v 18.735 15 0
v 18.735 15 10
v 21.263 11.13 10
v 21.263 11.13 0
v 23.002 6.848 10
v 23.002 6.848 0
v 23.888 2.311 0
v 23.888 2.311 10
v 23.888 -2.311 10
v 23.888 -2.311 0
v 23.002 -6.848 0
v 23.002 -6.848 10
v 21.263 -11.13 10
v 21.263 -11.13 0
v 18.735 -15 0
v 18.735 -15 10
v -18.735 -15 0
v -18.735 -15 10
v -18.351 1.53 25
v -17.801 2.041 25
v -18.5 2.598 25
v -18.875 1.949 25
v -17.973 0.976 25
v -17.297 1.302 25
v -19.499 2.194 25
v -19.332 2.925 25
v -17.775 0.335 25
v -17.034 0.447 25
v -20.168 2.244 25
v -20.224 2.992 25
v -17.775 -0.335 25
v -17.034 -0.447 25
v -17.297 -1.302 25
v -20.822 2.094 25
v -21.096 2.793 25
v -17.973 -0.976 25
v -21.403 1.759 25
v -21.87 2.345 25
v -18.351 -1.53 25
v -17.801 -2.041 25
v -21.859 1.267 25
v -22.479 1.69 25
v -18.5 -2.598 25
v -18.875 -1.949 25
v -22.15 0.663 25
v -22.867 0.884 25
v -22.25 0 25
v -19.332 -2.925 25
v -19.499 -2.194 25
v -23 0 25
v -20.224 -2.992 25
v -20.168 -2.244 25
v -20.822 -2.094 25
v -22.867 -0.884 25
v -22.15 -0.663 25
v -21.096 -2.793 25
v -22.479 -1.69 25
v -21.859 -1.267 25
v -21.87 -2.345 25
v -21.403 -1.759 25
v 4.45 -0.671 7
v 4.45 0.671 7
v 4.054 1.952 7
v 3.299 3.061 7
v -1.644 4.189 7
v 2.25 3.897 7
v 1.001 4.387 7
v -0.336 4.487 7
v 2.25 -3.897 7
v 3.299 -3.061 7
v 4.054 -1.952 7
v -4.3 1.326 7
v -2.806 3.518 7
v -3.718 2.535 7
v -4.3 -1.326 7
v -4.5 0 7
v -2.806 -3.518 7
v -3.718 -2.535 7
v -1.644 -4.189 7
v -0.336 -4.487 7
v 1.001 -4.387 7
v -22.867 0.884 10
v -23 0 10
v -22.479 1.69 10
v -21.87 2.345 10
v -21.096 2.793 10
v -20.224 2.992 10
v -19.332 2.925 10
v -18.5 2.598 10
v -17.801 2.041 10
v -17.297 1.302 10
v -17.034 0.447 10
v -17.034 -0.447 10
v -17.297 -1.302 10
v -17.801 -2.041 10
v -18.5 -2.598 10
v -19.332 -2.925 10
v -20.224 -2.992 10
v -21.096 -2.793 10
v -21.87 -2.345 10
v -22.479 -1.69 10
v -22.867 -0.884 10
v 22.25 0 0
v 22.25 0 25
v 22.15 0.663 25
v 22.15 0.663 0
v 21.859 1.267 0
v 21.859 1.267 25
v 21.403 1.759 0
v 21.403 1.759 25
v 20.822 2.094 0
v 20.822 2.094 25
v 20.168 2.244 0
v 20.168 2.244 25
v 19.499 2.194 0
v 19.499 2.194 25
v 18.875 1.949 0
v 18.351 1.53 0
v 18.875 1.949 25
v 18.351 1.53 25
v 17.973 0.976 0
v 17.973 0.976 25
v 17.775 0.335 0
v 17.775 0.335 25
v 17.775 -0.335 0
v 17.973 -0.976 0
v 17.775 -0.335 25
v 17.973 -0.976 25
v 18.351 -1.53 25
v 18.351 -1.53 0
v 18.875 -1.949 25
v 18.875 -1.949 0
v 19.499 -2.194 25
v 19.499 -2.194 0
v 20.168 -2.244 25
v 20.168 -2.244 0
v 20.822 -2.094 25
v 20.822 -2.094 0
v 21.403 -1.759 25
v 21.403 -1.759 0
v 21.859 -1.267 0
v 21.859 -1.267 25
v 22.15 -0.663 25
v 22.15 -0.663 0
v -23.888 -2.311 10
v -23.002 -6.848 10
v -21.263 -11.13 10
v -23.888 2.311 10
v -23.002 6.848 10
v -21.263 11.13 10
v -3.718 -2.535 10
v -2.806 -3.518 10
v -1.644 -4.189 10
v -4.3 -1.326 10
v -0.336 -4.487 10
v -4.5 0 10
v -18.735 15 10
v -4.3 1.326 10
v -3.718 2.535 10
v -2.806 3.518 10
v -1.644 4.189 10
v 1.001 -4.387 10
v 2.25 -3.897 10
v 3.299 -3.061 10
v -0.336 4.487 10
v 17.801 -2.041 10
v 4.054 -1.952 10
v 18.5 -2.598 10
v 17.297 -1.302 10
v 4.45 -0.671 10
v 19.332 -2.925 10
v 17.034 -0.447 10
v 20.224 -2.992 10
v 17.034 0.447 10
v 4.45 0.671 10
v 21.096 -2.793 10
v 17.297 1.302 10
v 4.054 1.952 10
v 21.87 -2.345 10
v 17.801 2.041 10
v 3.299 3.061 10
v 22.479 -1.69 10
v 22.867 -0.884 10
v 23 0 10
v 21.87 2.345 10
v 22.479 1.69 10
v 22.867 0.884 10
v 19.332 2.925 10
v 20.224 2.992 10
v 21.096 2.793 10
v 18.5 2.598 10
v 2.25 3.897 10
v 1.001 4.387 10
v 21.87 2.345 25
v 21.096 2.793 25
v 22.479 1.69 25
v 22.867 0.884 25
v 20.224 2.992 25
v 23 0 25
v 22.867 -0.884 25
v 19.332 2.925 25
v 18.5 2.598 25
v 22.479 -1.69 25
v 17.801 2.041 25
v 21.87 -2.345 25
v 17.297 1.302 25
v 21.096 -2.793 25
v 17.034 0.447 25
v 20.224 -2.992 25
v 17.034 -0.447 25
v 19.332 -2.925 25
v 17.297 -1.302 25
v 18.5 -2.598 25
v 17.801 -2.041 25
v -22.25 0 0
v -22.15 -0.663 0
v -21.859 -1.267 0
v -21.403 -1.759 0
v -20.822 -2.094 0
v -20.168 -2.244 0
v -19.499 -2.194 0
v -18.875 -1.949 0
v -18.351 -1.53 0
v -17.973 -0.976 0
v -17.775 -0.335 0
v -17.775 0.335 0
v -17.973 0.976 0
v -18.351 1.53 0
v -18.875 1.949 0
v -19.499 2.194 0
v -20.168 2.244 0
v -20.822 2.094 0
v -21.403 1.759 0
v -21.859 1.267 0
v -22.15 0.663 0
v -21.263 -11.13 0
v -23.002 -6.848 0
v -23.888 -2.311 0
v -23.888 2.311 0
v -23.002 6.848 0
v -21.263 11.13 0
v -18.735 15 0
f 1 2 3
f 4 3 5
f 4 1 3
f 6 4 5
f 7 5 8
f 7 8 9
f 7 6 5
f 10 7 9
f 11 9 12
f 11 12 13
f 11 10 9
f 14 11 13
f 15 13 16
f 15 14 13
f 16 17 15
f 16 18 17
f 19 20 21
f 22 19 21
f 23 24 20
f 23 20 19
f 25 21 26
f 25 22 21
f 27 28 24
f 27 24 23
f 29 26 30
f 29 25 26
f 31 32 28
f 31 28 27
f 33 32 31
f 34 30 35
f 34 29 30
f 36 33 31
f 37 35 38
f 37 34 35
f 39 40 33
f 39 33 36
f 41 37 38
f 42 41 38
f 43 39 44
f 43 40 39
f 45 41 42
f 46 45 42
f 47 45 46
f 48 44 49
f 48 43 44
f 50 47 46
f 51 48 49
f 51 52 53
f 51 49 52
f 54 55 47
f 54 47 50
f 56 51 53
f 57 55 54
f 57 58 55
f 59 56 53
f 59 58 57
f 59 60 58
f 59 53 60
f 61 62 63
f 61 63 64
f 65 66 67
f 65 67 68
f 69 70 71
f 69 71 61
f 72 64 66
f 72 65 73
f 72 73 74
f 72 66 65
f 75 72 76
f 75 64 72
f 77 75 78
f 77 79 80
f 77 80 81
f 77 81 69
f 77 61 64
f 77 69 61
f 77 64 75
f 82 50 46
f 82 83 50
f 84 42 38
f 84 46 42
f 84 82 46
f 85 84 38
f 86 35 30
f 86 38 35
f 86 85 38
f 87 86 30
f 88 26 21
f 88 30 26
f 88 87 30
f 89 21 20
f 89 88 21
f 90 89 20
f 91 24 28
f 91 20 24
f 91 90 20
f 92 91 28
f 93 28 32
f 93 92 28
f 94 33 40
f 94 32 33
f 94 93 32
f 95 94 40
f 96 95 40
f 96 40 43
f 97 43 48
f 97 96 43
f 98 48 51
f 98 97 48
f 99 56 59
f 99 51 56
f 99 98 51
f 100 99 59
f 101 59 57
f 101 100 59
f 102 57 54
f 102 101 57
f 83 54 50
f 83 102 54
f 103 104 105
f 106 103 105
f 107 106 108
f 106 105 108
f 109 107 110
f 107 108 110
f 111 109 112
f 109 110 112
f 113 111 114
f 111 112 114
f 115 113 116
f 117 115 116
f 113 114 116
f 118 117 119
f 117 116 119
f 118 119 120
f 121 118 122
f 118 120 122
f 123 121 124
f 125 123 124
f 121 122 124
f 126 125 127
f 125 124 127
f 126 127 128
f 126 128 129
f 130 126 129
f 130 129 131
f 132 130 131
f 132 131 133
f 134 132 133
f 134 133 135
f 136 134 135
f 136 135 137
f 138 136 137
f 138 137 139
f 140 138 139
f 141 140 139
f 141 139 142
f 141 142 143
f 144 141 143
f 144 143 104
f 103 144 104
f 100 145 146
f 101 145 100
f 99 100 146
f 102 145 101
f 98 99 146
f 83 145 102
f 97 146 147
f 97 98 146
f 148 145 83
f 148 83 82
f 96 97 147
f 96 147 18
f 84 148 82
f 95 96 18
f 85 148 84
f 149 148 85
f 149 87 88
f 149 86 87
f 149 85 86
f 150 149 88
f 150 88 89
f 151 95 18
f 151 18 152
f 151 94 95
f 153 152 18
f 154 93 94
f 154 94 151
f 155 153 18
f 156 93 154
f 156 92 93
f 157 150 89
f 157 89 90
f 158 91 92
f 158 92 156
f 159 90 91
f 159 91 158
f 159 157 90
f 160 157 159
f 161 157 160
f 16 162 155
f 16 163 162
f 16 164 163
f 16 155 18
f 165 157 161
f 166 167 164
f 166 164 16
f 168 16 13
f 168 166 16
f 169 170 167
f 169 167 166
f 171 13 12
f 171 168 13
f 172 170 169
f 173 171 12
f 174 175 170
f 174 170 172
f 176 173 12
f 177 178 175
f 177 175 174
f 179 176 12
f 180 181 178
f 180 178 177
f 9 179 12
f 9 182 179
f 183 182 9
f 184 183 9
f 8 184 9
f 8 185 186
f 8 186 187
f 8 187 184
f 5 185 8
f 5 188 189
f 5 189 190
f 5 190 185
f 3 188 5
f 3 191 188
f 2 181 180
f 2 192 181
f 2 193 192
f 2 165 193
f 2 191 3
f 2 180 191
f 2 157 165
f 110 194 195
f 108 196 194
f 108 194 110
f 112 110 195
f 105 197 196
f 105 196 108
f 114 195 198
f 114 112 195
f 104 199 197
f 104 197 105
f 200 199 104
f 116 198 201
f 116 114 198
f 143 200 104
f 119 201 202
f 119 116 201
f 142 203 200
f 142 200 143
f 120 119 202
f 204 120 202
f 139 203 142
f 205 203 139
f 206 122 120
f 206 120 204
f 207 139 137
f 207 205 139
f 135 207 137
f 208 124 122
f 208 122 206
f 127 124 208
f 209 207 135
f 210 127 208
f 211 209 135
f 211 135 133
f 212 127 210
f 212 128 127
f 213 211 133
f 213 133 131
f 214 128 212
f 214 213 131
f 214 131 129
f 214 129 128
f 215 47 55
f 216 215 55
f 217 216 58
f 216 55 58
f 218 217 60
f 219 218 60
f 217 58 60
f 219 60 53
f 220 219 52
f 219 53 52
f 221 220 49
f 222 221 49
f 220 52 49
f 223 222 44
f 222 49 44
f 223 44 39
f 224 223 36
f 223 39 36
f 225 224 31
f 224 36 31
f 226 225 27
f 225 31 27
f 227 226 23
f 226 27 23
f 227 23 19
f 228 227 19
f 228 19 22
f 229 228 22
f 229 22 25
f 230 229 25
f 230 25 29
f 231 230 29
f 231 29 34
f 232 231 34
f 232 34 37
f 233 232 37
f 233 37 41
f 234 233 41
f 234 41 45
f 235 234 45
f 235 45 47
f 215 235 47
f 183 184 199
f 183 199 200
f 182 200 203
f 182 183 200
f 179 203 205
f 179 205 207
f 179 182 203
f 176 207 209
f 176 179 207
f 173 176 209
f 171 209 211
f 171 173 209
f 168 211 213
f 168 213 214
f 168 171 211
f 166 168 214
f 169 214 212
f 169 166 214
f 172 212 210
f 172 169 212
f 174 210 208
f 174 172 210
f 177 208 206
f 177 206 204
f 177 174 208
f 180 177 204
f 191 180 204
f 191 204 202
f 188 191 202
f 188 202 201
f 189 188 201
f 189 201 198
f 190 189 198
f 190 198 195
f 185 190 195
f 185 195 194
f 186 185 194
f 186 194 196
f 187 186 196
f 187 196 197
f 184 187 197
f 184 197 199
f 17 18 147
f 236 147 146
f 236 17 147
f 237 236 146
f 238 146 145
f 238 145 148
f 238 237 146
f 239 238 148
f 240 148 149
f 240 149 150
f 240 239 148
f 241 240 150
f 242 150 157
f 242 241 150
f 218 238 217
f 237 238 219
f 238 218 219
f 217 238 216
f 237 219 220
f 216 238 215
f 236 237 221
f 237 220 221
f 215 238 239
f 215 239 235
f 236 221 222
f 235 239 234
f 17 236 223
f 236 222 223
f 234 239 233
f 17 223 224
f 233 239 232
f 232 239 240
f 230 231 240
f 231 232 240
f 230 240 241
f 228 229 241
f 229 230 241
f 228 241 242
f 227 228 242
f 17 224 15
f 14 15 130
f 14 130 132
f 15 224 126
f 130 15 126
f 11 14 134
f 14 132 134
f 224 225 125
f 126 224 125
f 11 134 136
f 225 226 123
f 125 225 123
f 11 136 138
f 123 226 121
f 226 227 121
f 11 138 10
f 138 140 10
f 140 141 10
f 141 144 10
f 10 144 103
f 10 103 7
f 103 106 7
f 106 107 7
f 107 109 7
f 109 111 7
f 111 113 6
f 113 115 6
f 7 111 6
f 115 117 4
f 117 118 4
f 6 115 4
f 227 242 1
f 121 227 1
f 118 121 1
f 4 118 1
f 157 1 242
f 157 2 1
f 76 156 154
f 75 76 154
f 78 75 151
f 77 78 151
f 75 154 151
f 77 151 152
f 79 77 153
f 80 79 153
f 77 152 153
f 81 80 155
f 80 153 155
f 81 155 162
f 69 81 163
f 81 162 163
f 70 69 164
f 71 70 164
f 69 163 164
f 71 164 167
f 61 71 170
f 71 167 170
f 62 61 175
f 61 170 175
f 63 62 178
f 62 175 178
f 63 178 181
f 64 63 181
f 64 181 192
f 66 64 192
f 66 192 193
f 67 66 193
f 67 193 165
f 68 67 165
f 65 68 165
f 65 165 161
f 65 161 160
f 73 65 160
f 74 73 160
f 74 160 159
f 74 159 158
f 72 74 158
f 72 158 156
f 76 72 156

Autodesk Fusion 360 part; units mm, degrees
sketch "Esquisse1" plane through (0, 0, 0) normal (0, 0, 1) x (1, 0, 0)
  circle A0 centre (0, 0) radius 24
  dimension "d1" = 48
extrude "Extrusion1" add sketch "Esquisse1" along normal blind 10
sketch "Esquisse2" plane through (0, 0, 10) normal (0, 0, 1) x (-1, 0, 0)
  circle A0 centre (0, 0) radius 24
  circle A1 centre (0, 0) radius 4.5
  dimension "d4" = 9
extrude "Extrusion2" cut sketch "Esquisse2" against normal blind 3 contours A1
sketch "Esquisse3" plane through (0, 0, 10) normal (0, 0, 1) x (-1, 0, 0)
  circle A0 centre (0, 0) radius 4.5
  circle A1 centre (0, 0) radius 24
  circle A2 centre (20, 0) radius 3
  dimension "d7" = 20
  dimension "d17" = 6
extrude "Extrusion3" add sketch "Esquisse3" along normal blind 15 contours A2
mirror "Symétrie miroir1" about plane through (0, 0, 0) normal (1, 0, 0) of "Extrusion3"
sketch "Esquisse4" plane through (0, 0, 25) normal (0, 0, 1) x (-1, 0, 0)
  circle A0 centre (20, 0) radius 3
  circle A1 centre (20, 0) radius 2.25
  dimension "d12" = 4.5
extrude "Extrusion4" cut sketch "Esquisse4" against normal blind 36 contours A1
mirror "Symétrie miroir2" about plane through (0, 0, 0) normal (1, 0, 0) of "Extrusion4"
sketch "Esquisse5" plane through (0, 0, 10) normal (0, 0, 1) x (-1, 0, 0)
  circle A0 centre (-20, 0) radius 3
  circle A1 centre (20, 0) radius 3
  circle A2 centre (0, 0) radius 4.5
  circle A3 centre (0, 0) radius 24
sketch "Esquisse6" plane through (0, 0, 10) normal (0, 0, 1) x (-1, 0, 0)
  line L0 (29.6799, -30) -> (-29.6799, -30)
  line L1 (-29.6799, -30) -> (-29.6799, -15)
  line L2 (-29.6799, -15) -> (29.6799, -15)
  line L3 (29.6799, -15) -> (29.6799, -30)
  line L4 (0, -1.75) -> (0, -22.5)
  line L5 (-20, 0) -> (-2.5, 0)
  dimension "d18" = 15
  dimension "d19" = 15
extrude "Extrusion5" cut sketch "Esquisse6" against normal blind 25
mirror "Symétrie miroir3" about plane through (0, 0, 0) normal (0, 1, 0) of "Extrusion5"
